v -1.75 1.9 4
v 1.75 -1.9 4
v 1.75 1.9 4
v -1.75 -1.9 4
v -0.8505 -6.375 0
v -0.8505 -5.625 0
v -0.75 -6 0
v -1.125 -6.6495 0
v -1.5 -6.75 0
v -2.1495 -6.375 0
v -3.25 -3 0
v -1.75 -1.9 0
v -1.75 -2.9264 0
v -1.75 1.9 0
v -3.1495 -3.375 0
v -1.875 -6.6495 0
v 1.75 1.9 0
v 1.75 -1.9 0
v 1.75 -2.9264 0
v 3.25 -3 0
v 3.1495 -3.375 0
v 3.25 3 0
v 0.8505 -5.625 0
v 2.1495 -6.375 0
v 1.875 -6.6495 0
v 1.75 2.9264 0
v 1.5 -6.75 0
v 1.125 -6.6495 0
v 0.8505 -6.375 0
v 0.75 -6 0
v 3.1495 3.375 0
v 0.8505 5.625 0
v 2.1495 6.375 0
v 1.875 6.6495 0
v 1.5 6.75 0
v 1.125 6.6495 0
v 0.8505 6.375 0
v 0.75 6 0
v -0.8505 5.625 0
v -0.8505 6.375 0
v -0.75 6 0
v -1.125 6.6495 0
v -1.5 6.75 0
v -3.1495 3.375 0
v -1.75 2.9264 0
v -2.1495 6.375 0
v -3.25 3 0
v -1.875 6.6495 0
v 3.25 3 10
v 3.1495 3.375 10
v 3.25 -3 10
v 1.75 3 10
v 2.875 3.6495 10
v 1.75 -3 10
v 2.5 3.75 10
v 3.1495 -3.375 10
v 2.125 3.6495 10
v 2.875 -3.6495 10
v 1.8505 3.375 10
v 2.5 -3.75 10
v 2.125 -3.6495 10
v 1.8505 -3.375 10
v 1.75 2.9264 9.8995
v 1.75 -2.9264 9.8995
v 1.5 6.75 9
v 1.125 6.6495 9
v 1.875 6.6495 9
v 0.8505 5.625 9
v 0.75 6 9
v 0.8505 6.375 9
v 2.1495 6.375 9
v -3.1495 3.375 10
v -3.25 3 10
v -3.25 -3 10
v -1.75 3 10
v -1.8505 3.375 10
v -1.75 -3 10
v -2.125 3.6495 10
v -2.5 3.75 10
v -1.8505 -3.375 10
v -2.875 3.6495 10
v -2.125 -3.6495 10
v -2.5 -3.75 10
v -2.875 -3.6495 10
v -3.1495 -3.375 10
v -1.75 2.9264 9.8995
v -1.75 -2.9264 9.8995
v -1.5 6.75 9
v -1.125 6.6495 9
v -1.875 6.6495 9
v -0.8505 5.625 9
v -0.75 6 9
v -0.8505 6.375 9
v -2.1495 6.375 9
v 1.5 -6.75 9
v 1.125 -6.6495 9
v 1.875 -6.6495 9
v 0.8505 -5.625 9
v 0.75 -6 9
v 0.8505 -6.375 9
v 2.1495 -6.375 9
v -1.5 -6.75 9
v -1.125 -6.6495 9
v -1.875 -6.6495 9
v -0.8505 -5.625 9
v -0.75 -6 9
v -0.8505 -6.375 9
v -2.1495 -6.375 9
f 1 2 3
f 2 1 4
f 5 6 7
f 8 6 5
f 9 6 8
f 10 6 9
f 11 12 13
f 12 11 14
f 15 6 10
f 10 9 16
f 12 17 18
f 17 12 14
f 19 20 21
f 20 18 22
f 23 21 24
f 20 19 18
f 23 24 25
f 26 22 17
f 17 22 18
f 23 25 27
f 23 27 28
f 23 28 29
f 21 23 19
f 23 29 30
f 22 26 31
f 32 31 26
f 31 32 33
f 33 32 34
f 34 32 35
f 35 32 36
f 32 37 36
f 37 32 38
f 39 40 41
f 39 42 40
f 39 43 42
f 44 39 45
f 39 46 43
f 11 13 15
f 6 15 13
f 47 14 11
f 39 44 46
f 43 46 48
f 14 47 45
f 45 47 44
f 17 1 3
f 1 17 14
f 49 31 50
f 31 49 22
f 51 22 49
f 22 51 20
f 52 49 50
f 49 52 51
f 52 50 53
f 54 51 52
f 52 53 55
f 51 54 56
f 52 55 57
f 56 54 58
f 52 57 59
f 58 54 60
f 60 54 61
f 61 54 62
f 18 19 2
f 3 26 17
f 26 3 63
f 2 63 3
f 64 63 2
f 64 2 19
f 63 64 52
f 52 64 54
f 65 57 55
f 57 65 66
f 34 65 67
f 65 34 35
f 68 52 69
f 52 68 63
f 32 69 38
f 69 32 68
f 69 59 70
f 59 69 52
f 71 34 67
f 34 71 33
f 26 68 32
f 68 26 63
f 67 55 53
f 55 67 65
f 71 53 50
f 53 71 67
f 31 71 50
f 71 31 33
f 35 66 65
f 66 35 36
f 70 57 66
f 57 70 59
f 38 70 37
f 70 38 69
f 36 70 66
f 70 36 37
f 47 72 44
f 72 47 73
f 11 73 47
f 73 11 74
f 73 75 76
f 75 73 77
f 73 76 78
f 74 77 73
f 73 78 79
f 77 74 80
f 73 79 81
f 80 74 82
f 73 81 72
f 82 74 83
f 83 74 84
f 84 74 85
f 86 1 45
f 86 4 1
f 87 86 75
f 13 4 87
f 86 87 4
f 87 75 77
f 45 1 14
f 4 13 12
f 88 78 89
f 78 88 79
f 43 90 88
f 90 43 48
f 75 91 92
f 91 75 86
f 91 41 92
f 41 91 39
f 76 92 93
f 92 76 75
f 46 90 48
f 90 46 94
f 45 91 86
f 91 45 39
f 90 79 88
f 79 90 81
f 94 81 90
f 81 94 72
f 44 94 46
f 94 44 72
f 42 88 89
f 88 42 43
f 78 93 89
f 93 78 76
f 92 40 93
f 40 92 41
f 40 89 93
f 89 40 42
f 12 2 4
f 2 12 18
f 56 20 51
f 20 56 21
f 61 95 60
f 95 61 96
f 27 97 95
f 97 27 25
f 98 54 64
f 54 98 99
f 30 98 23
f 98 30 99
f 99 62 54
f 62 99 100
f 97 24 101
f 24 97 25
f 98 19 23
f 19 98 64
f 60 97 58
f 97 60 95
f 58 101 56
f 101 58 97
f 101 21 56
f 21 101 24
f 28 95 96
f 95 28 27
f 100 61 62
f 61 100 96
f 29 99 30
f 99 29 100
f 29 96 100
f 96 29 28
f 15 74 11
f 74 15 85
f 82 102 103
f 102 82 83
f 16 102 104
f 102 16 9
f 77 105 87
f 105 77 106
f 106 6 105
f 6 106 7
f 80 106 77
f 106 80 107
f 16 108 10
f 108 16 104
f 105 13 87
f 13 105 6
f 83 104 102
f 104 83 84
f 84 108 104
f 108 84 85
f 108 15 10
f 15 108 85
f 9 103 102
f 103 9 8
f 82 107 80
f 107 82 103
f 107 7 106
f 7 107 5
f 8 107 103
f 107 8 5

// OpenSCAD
mirror([0,0,0]) quad();
mirror([1,0,0]) quad();
mirror([0,1,0]) quad();
mirror([0,1,0]) mirror([1,0,0]) quad();

%cube([2,20,10],center=true);

module quad() {
    cube([2.5,1.9,4]);
    hull() {
        translate([2.5,0,0]) cylinder(r=1.5/2,h=10,$fn=12);
        translate([2.5,3,0]) cylinder(r=1.5/2,h=10,$fn=12);
    }
    hull() {
        translate([2.5,3,0]) cylinder(r=1.5/2,h=10,$fn=12);
        translate([1.5,6,0]) cylinder(r=1.5/2,h=9,$fn=12);
    }
}
